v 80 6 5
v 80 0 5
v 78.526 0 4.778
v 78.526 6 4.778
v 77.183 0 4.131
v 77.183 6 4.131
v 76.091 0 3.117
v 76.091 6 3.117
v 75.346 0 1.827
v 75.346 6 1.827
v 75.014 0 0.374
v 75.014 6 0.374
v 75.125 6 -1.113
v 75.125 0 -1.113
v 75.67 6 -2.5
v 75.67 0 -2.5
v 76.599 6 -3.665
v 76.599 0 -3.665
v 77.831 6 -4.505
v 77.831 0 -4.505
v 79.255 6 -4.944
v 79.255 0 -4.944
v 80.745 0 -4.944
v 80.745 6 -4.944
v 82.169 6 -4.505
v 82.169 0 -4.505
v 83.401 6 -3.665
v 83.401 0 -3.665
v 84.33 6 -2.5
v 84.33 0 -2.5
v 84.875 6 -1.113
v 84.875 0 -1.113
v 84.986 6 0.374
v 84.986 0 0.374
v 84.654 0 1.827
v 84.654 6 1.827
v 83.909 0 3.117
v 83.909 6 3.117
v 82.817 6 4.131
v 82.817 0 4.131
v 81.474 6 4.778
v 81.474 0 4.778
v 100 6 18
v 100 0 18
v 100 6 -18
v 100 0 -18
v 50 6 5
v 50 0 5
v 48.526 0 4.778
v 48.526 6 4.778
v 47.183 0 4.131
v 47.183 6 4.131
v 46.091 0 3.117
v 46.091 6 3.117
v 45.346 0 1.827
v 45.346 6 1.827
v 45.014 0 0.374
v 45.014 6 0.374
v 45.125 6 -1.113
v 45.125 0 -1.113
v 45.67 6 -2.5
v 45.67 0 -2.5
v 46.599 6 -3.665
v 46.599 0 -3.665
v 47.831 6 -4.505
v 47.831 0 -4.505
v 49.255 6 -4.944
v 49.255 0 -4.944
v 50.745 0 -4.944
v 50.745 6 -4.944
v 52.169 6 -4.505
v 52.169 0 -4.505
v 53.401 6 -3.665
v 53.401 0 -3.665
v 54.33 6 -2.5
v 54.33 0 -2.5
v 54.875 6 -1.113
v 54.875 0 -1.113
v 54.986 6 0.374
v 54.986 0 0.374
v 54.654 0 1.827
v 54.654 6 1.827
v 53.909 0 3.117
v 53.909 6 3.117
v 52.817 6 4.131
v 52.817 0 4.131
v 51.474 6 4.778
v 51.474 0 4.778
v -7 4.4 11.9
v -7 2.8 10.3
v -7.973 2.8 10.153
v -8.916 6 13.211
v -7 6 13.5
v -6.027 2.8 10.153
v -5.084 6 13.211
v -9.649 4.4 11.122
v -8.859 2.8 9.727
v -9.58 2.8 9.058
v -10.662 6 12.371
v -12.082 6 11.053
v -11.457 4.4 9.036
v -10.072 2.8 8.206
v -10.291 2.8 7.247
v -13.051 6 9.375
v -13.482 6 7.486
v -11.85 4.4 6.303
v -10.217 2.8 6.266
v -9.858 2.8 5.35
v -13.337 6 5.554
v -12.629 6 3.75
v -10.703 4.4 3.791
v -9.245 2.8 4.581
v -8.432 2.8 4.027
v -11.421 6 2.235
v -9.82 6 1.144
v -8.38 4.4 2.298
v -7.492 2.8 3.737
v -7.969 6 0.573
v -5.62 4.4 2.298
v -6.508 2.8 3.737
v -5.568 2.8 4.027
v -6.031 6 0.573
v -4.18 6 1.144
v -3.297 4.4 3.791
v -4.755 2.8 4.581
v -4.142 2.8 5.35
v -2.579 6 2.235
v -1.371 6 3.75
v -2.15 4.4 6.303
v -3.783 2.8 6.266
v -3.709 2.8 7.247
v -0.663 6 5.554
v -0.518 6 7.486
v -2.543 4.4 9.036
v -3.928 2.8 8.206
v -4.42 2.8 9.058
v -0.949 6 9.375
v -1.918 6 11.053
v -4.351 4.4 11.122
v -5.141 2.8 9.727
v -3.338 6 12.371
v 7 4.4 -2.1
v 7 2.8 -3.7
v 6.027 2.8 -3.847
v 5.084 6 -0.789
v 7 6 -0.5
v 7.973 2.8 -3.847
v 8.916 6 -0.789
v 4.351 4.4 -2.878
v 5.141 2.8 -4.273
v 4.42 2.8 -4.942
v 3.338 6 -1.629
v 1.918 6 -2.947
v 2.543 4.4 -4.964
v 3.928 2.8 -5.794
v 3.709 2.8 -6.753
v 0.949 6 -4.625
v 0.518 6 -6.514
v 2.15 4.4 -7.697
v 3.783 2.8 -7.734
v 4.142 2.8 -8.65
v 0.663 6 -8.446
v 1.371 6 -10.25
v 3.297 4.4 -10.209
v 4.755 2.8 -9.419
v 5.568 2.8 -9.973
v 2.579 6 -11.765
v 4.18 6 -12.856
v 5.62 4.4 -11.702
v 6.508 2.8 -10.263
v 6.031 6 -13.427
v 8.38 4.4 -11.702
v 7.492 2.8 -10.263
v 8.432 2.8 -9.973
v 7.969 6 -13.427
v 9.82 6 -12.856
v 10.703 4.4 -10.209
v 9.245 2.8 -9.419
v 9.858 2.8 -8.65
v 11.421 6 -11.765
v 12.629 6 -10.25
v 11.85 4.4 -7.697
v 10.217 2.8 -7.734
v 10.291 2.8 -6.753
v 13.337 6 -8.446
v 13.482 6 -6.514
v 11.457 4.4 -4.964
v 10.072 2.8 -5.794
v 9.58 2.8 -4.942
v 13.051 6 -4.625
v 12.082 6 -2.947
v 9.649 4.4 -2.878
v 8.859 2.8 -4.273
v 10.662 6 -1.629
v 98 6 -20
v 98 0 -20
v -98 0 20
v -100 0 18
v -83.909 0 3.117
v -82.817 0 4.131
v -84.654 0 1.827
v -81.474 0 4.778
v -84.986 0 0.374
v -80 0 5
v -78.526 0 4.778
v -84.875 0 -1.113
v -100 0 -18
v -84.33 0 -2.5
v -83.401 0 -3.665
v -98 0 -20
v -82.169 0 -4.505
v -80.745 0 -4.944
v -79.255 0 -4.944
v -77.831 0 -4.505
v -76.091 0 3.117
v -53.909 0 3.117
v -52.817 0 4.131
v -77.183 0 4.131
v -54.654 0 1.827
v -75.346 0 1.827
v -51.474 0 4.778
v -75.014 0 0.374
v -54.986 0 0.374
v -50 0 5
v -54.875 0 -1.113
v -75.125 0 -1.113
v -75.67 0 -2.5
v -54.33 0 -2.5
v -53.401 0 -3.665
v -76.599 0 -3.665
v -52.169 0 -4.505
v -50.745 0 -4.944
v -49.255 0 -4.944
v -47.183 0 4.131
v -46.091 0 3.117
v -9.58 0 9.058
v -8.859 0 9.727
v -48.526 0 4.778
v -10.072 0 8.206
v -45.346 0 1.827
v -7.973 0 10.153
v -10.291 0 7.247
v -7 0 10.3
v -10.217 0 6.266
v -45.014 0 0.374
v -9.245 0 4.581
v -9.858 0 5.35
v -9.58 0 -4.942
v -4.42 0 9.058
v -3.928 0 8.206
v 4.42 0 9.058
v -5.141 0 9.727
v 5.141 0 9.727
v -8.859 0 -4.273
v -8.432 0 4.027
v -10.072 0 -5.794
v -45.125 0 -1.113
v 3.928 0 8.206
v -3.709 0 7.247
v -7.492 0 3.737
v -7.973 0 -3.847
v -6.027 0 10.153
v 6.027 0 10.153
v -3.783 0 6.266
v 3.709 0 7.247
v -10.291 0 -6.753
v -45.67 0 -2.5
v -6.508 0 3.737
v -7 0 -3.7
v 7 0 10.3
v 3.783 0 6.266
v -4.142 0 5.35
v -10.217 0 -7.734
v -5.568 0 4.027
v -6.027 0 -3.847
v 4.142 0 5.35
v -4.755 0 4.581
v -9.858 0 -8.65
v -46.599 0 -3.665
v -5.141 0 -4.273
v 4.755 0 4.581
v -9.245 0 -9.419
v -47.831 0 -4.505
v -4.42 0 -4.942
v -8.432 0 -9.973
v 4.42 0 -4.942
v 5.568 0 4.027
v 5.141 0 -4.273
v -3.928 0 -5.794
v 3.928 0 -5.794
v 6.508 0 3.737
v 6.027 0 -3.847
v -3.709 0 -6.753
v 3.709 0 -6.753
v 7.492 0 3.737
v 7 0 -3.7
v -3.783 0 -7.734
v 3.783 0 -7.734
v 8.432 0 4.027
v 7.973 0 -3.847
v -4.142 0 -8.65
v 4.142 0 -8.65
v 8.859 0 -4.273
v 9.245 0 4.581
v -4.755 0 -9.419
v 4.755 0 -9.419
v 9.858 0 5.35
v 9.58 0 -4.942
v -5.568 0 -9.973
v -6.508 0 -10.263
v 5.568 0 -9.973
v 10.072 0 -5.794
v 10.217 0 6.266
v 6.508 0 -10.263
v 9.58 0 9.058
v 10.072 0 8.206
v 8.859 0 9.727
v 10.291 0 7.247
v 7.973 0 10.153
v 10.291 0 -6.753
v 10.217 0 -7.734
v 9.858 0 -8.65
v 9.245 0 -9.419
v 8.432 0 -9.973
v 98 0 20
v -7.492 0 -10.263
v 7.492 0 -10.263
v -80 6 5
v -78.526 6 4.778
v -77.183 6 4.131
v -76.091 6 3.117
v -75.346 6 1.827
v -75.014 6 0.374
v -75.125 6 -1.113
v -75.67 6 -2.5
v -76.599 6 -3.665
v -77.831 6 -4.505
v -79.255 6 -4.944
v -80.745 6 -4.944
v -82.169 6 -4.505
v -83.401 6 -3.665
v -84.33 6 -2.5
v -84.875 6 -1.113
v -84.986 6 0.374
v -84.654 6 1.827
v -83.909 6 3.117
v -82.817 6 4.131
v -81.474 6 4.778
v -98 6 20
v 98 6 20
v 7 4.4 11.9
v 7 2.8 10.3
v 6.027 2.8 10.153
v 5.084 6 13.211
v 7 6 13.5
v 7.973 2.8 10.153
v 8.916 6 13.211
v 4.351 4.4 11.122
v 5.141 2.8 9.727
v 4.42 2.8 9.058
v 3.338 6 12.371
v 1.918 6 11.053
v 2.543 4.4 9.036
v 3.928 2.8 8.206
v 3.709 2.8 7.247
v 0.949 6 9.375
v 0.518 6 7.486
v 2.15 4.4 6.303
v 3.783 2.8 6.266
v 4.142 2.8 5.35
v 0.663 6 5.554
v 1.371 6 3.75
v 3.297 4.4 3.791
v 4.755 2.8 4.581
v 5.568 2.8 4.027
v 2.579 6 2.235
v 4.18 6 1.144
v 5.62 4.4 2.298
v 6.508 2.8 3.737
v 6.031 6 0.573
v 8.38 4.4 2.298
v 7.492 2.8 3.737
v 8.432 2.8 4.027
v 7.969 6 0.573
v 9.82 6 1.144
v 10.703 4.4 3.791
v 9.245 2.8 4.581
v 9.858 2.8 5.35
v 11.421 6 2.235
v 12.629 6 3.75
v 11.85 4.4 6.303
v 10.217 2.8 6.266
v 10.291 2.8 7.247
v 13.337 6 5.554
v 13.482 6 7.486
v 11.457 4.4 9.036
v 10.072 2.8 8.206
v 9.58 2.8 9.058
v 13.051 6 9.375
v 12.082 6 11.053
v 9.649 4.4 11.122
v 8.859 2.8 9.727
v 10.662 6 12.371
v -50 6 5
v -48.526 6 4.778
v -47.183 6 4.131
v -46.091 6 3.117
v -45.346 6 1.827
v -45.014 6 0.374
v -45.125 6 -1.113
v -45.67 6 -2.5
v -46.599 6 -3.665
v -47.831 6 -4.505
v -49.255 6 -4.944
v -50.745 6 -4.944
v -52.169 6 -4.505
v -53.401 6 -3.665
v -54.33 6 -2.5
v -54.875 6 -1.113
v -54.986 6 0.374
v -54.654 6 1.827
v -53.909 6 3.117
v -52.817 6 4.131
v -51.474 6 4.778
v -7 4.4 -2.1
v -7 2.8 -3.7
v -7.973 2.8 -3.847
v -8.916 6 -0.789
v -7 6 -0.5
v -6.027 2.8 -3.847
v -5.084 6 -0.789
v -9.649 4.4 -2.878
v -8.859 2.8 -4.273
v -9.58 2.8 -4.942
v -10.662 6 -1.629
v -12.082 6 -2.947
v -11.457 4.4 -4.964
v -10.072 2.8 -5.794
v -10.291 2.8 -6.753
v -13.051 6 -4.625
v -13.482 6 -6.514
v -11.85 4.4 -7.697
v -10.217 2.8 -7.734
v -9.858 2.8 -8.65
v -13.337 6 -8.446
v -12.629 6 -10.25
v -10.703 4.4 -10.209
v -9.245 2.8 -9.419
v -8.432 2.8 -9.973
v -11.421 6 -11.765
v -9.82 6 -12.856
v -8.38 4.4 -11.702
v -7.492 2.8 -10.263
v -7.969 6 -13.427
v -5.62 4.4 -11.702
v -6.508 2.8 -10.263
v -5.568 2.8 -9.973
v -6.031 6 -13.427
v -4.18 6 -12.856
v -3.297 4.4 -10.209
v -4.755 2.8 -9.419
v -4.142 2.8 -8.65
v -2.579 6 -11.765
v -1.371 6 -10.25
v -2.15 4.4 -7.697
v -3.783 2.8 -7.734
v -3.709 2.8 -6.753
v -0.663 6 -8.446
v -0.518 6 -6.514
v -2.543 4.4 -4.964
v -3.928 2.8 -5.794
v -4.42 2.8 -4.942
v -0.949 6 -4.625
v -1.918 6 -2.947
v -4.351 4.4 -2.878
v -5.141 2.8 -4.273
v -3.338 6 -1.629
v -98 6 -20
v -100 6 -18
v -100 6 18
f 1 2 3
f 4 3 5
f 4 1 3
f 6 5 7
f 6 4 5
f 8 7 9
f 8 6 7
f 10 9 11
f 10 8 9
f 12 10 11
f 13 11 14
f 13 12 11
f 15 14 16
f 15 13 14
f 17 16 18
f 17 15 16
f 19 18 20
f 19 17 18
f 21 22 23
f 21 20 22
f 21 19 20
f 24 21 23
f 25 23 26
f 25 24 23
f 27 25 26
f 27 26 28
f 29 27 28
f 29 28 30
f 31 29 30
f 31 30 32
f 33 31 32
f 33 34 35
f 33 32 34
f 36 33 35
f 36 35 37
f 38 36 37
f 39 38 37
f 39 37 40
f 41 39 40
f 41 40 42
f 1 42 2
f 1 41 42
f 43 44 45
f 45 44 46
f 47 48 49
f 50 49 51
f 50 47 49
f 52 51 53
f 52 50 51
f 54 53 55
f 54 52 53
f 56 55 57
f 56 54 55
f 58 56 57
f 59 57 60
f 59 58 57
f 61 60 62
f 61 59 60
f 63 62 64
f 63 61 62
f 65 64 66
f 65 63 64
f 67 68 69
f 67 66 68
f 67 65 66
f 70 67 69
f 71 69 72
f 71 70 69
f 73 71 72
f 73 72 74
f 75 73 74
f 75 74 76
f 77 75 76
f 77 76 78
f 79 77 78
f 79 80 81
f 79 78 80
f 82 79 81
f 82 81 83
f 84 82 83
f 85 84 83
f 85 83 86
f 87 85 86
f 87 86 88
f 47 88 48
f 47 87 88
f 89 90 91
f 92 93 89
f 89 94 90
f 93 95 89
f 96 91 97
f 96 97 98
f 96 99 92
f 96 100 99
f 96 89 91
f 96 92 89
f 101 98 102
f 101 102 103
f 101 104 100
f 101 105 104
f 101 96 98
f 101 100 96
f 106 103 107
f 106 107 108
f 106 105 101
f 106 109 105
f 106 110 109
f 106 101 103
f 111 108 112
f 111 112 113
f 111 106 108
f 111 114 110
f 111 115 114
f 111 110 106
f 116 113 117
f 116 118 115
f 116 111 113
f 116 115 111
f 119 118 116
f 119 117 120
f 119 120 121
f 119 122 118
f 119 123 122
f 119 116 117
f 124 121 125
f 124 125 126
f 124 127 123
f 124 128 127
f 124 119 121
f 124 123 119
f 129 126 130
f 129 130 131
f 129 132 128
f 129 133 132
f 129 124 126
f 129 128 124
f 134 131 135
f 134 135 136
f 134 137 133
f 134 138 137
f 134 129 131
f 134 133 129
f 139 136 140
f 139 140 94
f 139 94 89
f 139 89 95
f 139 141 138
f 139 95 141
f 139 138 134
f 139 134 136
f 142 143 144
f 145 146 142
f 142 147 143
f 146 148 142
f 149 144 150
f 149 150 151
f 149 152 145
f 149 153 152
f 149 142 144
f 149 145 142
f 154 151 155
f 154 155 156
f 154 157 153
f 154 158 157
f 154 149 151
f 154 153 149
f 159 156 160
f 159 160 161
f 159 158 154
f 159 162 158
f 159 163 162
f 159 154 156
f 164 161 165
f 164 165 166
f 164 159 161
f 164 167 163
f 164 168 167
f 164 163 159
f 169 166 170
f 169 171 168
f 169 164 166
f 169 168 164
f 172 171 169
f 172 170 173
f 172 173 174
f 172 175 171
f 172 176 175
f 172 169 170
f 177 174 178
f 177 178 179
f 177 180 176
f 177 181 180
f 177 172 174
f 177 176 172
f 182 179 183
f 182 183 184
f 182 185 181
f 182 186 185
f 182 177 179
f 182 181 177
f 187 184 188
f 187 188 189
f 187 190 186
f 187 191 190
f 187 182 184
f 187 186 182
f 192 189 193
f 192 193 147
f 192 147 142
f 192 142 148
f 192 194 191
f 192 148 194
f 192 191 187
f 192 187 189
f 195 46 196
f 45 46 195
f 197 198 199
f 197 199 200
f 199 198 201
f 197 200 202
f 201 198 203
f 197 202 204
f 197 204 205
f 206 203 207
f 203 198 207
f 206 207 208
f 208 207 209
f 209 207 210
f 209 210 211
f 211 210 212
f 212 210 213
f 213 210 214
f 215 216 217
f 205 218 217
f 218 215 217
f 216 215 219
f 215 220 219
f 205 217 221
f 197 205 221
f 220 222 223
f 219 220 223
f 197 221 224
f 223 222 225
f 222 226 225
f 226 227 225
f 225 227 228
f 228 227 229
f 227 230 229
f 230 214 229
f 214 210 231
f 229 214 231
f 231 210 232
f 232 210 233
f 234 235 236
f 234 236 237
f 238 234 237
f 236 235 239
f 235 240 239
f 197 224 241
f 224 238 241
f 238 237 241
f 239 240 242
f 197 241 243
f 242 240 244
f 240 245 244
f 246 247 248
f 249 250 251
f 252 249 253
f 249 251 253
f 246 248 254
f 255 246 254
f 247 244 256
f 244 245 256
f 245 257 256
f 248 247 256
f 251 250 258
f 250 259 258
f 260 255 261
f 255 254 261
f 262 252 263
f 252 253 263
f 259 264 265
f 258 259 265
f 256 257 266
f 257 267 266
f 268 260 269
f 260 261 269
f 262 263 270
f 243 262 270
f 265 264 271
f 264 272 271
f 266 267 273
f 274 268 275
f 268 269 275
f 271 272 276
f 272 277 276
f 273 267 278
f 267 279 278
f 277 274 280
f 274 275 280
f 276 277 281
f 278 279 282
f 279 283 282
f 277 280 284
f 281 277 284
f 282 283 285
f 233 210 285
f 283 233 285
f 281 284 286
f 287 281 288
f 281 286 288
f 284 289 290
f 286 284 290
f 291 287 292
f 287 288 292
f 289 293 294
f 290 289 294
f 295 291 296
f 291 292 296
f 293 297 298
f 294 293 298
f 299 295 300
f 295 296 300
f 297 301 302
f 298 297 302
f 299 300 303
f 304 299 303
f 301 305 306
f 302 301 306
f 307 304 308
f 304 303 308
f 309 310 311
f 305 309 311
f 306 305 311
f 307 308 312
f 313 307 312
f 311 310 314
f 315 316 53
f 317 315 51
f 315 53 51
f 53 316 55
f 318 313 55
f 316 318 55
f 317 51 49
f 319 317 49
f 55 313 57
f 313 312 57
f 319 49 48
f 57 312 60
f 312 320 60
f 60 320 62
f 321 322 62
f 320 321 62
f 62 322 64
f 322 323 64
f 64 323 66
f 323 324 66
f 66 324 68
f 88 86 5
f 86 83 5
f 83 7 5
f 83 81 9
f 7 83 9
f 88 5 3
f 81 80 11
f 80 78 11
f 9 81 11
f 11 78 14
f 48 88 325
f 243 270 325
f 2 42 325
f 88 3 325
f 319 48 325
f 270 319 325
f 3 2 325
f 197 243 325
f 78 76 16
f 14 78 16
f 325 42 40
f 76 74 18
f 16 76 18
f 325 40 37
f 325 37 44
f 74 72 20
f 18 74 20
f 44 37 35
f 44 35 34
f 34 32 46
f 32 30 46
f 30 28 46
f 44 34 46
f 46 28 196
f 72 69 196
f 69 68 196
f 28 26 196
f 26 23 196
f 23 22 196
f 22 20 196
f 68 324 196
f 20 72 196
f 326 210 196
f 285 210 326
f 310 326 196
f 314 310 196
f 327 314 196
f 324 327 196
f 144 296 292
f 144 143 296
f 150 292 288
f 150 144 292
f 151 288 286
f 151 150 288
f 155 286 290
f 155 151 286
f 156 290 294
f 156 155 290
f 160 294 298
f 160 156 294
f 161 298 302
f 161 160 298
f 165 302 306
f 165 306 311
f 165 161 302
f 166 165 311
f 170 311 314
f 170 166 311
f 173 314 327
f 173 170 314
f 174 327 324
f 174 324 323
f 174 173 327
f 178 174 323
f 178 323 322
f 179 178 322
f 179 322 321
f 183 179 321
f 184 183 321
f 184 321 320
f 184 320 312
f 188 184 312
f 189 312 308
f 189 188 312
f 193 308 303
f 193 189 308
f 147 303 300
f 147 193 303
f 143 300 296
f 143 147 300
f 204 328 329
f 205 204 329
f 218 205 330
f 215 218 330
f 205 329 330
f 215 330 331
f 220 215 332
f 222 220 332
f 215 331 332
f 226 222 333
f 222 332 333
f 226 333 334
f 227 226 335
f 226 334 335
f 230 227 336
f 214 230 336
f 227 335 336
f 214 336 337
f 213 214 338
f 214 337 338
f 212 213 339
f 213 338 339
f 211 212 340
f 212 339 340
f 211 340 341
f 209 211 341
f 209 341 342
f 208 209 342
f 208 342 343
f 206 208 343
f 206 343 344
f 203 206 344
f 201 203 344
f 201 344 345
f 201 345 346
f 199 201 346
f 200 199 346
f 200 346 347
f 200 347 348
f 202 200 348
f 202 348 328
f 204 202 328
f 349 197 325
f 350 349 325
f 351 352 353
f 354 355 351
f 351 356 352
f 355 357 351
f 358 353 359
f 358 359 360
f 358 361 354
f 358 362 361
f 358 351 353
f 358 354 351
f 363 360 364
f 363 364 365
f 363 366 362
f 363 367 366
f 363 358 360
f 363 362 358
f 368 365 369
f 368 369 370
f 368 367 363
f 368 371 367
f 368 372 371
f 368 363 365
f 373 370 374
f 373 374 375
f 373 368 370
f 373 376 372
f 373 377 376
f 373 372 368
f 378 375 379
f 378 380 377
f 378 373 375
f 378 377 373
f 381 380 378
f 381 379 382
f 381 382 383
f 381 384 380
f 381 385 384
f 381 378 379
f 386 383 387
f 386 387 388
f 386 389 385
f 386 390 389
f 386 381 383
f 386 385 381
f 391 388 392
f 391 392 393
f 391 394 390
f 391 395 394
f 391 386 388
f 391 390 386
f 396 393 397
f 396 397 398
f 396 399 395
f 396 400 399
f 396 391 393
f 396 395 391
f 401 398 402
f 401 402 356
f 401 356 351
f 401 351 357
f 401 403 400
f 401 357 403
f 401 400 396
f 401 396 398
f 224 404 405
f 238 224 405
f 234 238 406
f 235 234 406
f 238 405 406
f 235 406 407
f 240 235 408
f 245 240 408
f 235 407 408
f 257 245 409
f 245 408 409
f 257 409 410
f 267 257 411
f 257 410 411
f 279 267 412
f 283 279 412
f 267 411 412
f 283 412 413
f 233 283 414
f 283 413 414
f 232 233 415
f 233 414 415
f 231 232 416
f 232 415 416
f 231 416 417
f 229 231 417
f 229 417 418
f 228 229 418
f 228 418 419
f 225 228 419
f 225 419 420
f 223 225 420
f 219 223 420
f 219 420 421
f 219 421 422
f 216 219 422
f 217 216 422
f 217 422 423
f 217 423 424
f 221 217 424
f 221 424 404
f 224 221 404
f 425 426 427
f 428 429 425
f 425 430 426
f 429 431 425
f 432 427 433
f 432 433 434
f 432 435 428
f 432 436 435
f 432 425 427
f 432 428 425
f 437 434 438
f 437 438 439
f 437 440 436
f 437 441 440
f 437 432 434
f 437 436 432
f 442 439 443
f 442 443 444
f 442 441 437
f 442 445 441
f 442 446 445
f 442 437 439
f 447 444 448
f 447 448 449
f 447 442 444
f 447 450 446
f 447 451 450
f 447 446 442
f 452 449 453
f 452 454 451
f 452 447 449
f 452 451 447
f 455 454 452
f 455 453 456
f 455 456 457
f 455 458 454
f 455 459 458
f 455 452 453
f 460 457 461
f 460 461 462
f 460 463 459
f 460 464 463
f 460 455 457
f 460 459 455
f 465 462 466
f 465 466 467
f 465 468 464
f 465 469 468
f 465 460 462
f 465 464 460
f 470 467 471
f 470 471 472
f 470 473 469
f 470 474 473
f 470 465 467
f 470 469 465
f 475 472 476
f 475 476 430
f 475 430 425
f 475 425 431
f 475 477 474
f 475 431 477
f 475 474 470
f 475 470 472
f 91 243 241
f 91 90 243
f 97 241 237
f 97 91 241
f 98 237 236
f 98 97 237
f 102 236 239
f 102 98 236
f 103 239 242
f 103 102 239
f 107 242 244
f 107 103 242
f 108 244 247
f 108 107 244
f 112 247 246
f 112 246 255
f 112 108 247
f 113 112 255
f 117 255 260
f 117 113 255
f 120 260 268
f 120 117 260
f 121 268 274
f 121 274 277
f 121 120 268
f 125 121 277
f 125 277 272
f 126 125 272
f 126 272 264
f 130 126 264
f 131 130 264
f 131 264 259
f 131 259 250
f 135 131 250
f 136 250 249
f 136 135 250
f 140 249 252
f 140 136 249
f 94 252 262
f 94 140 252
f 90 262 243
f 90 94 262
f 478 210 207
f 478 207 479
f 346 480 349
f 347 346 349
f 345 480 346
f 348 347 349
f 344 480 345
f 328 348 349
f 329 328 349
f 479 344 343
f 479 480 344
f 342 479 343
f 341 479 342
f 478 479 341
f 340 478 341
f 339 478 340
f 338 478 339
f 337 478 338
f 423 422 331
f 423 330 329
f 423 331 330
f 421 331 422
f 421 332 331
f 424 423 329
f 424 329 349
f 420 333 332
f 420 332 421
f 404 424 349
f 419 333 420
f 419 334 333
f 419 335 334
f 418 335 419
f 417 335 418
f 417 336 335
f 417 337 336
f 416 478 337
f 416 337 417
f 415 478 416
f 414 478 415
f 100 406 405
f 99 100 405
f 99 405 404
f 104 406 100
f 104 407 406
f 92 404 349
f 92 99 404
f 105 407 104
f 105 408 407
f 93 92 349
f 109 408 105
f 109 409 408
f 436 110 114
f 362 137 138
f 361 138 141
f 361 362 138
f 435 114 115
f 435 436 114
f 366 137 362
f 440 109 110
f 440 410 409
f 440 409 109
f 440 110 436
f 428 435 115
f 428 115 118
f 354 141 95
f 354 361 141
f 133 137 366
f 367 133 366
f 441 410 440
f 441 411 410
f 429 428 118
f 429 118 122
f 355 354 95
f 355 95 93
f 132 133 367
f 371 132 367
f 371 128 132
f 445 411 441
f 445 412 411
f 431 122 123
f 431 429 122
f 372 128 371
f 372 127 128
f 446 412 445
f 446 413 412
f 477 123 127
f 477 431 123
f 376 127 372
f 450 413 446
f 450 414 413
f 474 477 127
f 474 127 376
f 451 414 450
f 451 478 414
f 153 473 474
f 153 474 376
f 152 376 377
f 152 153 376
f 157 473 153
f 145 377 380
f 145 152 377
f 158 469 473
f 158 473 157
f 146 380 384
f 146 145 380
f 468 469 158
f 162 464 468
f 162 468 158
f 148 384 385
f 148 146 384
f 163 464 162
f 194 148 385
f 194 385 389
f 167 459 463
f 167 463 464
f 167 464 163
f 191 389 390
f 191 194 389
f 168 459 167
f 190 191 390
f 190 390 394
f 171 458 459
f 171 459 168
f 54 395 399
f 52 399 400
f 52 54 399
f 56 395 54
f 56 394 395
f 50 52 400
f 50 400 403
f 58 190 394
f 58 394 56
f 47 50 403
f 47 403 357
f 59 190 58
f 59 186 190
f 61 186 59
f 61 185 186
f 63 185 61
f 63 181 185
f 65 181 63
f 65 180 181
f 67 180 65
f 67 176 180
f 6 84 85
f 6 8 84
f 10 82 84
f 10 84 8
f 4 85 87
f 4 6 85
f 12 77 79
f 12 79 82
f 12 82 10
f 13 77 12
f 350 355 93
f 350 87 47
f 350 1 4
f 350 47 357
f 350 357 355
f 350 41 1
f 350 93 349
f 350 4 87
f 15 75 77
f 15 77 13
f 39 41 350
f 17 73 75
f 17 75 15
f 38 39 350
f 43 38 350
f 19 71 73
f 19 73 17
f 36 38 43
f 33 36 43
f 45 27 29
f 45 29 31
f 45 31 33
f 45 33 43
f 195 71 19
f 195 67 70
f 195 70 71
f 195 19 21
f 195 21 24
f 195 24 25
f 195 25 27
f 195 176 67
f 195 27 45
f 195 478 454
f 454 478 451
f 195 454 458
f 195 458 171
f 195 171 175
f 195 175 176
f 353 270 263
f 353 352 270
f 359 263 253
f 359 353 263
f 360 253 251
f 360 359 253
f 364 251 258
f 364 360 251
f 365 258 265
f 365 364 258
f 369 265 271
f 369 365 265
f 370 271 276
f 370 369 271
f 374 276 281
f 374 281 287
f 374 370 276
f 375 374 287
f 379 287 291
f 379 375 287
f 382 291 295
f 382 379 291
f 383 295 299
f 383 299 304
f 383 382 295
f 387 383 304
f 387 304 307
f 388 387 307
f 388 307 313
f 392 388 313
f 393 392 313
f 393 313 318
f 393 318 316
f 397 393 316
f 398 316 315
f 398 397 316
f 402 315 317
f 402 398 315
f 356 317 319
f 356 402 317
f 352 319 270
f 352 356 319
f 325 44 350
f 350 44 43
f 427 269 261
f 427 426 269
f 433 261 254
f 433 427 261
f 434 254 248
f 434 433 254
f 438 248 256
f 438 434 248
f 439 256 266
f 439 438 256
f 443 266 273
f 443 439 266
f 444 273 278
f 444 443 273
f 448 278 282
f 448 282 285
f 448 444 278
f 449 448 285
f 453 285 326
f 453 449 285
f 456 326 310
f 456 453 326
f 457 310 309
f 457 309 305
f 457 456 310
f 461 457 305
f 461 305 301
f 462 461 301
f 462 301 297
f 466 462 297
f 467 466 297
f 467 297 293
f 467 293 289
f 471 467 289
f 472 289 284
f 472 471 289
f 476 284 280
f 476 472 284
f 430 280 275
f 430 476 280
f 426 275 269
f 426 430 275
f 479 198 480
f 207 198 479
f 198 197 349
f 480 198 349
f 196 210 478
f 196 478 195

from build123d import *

# Parameters (mm, degrees)
SKETCH1_W                                    = 200
SKETCH1_H                                    = 40
BOSS_EXTRUDE1_DEPTH                          = 6
CSK_FOR_M6_COUNTERSUNK_FLAT_HEAD_SCR_2_COUNT = 2
CSK_FOR_M6_COUNTERSUNK_FLAT_HEAD_SCR_2_PITCH = 14
CSK_FOR_M6_COUNTERSUNK_FLAT_HEAD_SCR_3_COUNT = 2
CSK_FOR_M6_COUNTERSUNK_FLAT_HEAD_SCR_3_PITCH = 19.798989873
CSK_FOR_M6_COUNTERSUNK_FLAT_HEAD_SCR_4_COUNT = 2
CSK_FOR_M6_COUNTERSUNK_FLAT_HEAD_SCR_4_PITCH = 14
CHAMFER1_SIZE                                = 2
SKETCH8_R                                    = 5
CUT_EXTRUDE1_DEPTH                           = 103.156742313


with BuildPart() as part:
    # Sketch1 → Boss-Extrude1 (new body)
    with BuildSketch(Plane(origin=(0, 0, 0), x_dir=(1, 0, 0), z_dir=(0, 1, 0))):
        Rectangle(SKETCH1_W, SKETCH1_H)
    extrude(amount=BOSS_EXTRUDE1_DEPTH)

    # Sketch5 → CSK for M6 Countersunk Flat Head Screw1 (revolve, cut)
    with BuildSketch(Plane(origin=(-7, 6, -7), x_dir=(0, 0, 1), z_dir=(1, 0, 0))):
        Polygon((0, 0), (0, 6), (3.3, 6), (3.3, 3.2), (6.5, 0), align=None)
    csk_for_m6_countersunk_flat_head_screw1 = revolve(axis=Axis((-7, 12.35, -7), (0, -1, 0)), mode=Mode.SUBTRACT)

    # CSK for M6 Countersunk Flat Head Scr 2: CSK for M6 Countersunk Flat Head Screw1 ×2
    with Locations(*[(i * CSK_FOR_M6_COUNTERSUNK_FLAT_HEAD_SCR_2_PITCH, 0, 0) for i in range(1, CSK_FOR_M6_COUNTERSUNK_FLAT_HEAD_SCR_2_COUNT)]):
        add(csk_for_m6_countersunk_flat_head_screw1, mode=Mode.SUBTRACT)

    # CSK for M6 Countersunk Flat Head Scr 3: CSK for M6 Countersunk Flat Head Screw1 ×2
    with Locations(*[Vector(0.7071067811865476, 0, 0.7071067811865476) * (i * CSK_FOR_M6_COUNTERSUNK_FLAT_HEAD_SCR_3_PITCH) for i in range(1, CSK_FOR_M6_COUNTERSUNK_FLAT_HEAD_SCR_3_COUNT)]):
        add(csk_for_m6_countersunk_flat_head_screw1, mode=Mode.SUBTRACT)

    # CSK for M6 Countersunk Flat Head Scr 4: CSK for M6 Countersunk Flat Head Screw1 ×2
    with Locations(*[(0, 0, i * CSK_FOR_M6_COUNTERSUNK_FLAT_HEAD_SCR_4_PITCH) for i in range(1, CSK_FOR_M6_COUNTERSUNK_FLAT_HEAD_SCR_4_COUNT)]):
        add(csk_for_m6_countersunk_flat_head_screw1, mode=Mode.SUBTRACT)

    # Chamfer1
    chamfer1_edges = [part.edges().sort_by_distance(p)[0] for p in [
        (-100, 3, 20),
        (-100, 3, -20),
        (100, 3, -20),
        (100, 3, 20),
    ]]
    chamfer(chamfer1_edges, length=CHAMFER1_SIZE)

    # Sketch8 → Cut-Extrude1 (cut, through all)
    with BuildSketch(Plane(origin=(0, 6, 0), x_dir=(1, 0, 0), z_dir=(0, 1, 0))):
        with Locations(Location((-50, 0, 0), (0, 0, 270))):
            Circle(SKETCH8_R)
        with Locations(Location((-80, 0, 0), (0, 0, 270))):
            Circle(SKETCH8_R)
    cut_extrude1 = extrude(amount=-CUT_EXTRUDE1_DEPTH, mode=Mode.SUBTRACT)

    # Mirror1: Cut-Extrude1 across plane
    add(cut_extrude1.mirror(Plane(origin=(0, 0, 0), x_dir=(0, 0, 1), z_dir=(1, 0, 0))), mode=Mode.SUBTRACT)


solid = part.part
